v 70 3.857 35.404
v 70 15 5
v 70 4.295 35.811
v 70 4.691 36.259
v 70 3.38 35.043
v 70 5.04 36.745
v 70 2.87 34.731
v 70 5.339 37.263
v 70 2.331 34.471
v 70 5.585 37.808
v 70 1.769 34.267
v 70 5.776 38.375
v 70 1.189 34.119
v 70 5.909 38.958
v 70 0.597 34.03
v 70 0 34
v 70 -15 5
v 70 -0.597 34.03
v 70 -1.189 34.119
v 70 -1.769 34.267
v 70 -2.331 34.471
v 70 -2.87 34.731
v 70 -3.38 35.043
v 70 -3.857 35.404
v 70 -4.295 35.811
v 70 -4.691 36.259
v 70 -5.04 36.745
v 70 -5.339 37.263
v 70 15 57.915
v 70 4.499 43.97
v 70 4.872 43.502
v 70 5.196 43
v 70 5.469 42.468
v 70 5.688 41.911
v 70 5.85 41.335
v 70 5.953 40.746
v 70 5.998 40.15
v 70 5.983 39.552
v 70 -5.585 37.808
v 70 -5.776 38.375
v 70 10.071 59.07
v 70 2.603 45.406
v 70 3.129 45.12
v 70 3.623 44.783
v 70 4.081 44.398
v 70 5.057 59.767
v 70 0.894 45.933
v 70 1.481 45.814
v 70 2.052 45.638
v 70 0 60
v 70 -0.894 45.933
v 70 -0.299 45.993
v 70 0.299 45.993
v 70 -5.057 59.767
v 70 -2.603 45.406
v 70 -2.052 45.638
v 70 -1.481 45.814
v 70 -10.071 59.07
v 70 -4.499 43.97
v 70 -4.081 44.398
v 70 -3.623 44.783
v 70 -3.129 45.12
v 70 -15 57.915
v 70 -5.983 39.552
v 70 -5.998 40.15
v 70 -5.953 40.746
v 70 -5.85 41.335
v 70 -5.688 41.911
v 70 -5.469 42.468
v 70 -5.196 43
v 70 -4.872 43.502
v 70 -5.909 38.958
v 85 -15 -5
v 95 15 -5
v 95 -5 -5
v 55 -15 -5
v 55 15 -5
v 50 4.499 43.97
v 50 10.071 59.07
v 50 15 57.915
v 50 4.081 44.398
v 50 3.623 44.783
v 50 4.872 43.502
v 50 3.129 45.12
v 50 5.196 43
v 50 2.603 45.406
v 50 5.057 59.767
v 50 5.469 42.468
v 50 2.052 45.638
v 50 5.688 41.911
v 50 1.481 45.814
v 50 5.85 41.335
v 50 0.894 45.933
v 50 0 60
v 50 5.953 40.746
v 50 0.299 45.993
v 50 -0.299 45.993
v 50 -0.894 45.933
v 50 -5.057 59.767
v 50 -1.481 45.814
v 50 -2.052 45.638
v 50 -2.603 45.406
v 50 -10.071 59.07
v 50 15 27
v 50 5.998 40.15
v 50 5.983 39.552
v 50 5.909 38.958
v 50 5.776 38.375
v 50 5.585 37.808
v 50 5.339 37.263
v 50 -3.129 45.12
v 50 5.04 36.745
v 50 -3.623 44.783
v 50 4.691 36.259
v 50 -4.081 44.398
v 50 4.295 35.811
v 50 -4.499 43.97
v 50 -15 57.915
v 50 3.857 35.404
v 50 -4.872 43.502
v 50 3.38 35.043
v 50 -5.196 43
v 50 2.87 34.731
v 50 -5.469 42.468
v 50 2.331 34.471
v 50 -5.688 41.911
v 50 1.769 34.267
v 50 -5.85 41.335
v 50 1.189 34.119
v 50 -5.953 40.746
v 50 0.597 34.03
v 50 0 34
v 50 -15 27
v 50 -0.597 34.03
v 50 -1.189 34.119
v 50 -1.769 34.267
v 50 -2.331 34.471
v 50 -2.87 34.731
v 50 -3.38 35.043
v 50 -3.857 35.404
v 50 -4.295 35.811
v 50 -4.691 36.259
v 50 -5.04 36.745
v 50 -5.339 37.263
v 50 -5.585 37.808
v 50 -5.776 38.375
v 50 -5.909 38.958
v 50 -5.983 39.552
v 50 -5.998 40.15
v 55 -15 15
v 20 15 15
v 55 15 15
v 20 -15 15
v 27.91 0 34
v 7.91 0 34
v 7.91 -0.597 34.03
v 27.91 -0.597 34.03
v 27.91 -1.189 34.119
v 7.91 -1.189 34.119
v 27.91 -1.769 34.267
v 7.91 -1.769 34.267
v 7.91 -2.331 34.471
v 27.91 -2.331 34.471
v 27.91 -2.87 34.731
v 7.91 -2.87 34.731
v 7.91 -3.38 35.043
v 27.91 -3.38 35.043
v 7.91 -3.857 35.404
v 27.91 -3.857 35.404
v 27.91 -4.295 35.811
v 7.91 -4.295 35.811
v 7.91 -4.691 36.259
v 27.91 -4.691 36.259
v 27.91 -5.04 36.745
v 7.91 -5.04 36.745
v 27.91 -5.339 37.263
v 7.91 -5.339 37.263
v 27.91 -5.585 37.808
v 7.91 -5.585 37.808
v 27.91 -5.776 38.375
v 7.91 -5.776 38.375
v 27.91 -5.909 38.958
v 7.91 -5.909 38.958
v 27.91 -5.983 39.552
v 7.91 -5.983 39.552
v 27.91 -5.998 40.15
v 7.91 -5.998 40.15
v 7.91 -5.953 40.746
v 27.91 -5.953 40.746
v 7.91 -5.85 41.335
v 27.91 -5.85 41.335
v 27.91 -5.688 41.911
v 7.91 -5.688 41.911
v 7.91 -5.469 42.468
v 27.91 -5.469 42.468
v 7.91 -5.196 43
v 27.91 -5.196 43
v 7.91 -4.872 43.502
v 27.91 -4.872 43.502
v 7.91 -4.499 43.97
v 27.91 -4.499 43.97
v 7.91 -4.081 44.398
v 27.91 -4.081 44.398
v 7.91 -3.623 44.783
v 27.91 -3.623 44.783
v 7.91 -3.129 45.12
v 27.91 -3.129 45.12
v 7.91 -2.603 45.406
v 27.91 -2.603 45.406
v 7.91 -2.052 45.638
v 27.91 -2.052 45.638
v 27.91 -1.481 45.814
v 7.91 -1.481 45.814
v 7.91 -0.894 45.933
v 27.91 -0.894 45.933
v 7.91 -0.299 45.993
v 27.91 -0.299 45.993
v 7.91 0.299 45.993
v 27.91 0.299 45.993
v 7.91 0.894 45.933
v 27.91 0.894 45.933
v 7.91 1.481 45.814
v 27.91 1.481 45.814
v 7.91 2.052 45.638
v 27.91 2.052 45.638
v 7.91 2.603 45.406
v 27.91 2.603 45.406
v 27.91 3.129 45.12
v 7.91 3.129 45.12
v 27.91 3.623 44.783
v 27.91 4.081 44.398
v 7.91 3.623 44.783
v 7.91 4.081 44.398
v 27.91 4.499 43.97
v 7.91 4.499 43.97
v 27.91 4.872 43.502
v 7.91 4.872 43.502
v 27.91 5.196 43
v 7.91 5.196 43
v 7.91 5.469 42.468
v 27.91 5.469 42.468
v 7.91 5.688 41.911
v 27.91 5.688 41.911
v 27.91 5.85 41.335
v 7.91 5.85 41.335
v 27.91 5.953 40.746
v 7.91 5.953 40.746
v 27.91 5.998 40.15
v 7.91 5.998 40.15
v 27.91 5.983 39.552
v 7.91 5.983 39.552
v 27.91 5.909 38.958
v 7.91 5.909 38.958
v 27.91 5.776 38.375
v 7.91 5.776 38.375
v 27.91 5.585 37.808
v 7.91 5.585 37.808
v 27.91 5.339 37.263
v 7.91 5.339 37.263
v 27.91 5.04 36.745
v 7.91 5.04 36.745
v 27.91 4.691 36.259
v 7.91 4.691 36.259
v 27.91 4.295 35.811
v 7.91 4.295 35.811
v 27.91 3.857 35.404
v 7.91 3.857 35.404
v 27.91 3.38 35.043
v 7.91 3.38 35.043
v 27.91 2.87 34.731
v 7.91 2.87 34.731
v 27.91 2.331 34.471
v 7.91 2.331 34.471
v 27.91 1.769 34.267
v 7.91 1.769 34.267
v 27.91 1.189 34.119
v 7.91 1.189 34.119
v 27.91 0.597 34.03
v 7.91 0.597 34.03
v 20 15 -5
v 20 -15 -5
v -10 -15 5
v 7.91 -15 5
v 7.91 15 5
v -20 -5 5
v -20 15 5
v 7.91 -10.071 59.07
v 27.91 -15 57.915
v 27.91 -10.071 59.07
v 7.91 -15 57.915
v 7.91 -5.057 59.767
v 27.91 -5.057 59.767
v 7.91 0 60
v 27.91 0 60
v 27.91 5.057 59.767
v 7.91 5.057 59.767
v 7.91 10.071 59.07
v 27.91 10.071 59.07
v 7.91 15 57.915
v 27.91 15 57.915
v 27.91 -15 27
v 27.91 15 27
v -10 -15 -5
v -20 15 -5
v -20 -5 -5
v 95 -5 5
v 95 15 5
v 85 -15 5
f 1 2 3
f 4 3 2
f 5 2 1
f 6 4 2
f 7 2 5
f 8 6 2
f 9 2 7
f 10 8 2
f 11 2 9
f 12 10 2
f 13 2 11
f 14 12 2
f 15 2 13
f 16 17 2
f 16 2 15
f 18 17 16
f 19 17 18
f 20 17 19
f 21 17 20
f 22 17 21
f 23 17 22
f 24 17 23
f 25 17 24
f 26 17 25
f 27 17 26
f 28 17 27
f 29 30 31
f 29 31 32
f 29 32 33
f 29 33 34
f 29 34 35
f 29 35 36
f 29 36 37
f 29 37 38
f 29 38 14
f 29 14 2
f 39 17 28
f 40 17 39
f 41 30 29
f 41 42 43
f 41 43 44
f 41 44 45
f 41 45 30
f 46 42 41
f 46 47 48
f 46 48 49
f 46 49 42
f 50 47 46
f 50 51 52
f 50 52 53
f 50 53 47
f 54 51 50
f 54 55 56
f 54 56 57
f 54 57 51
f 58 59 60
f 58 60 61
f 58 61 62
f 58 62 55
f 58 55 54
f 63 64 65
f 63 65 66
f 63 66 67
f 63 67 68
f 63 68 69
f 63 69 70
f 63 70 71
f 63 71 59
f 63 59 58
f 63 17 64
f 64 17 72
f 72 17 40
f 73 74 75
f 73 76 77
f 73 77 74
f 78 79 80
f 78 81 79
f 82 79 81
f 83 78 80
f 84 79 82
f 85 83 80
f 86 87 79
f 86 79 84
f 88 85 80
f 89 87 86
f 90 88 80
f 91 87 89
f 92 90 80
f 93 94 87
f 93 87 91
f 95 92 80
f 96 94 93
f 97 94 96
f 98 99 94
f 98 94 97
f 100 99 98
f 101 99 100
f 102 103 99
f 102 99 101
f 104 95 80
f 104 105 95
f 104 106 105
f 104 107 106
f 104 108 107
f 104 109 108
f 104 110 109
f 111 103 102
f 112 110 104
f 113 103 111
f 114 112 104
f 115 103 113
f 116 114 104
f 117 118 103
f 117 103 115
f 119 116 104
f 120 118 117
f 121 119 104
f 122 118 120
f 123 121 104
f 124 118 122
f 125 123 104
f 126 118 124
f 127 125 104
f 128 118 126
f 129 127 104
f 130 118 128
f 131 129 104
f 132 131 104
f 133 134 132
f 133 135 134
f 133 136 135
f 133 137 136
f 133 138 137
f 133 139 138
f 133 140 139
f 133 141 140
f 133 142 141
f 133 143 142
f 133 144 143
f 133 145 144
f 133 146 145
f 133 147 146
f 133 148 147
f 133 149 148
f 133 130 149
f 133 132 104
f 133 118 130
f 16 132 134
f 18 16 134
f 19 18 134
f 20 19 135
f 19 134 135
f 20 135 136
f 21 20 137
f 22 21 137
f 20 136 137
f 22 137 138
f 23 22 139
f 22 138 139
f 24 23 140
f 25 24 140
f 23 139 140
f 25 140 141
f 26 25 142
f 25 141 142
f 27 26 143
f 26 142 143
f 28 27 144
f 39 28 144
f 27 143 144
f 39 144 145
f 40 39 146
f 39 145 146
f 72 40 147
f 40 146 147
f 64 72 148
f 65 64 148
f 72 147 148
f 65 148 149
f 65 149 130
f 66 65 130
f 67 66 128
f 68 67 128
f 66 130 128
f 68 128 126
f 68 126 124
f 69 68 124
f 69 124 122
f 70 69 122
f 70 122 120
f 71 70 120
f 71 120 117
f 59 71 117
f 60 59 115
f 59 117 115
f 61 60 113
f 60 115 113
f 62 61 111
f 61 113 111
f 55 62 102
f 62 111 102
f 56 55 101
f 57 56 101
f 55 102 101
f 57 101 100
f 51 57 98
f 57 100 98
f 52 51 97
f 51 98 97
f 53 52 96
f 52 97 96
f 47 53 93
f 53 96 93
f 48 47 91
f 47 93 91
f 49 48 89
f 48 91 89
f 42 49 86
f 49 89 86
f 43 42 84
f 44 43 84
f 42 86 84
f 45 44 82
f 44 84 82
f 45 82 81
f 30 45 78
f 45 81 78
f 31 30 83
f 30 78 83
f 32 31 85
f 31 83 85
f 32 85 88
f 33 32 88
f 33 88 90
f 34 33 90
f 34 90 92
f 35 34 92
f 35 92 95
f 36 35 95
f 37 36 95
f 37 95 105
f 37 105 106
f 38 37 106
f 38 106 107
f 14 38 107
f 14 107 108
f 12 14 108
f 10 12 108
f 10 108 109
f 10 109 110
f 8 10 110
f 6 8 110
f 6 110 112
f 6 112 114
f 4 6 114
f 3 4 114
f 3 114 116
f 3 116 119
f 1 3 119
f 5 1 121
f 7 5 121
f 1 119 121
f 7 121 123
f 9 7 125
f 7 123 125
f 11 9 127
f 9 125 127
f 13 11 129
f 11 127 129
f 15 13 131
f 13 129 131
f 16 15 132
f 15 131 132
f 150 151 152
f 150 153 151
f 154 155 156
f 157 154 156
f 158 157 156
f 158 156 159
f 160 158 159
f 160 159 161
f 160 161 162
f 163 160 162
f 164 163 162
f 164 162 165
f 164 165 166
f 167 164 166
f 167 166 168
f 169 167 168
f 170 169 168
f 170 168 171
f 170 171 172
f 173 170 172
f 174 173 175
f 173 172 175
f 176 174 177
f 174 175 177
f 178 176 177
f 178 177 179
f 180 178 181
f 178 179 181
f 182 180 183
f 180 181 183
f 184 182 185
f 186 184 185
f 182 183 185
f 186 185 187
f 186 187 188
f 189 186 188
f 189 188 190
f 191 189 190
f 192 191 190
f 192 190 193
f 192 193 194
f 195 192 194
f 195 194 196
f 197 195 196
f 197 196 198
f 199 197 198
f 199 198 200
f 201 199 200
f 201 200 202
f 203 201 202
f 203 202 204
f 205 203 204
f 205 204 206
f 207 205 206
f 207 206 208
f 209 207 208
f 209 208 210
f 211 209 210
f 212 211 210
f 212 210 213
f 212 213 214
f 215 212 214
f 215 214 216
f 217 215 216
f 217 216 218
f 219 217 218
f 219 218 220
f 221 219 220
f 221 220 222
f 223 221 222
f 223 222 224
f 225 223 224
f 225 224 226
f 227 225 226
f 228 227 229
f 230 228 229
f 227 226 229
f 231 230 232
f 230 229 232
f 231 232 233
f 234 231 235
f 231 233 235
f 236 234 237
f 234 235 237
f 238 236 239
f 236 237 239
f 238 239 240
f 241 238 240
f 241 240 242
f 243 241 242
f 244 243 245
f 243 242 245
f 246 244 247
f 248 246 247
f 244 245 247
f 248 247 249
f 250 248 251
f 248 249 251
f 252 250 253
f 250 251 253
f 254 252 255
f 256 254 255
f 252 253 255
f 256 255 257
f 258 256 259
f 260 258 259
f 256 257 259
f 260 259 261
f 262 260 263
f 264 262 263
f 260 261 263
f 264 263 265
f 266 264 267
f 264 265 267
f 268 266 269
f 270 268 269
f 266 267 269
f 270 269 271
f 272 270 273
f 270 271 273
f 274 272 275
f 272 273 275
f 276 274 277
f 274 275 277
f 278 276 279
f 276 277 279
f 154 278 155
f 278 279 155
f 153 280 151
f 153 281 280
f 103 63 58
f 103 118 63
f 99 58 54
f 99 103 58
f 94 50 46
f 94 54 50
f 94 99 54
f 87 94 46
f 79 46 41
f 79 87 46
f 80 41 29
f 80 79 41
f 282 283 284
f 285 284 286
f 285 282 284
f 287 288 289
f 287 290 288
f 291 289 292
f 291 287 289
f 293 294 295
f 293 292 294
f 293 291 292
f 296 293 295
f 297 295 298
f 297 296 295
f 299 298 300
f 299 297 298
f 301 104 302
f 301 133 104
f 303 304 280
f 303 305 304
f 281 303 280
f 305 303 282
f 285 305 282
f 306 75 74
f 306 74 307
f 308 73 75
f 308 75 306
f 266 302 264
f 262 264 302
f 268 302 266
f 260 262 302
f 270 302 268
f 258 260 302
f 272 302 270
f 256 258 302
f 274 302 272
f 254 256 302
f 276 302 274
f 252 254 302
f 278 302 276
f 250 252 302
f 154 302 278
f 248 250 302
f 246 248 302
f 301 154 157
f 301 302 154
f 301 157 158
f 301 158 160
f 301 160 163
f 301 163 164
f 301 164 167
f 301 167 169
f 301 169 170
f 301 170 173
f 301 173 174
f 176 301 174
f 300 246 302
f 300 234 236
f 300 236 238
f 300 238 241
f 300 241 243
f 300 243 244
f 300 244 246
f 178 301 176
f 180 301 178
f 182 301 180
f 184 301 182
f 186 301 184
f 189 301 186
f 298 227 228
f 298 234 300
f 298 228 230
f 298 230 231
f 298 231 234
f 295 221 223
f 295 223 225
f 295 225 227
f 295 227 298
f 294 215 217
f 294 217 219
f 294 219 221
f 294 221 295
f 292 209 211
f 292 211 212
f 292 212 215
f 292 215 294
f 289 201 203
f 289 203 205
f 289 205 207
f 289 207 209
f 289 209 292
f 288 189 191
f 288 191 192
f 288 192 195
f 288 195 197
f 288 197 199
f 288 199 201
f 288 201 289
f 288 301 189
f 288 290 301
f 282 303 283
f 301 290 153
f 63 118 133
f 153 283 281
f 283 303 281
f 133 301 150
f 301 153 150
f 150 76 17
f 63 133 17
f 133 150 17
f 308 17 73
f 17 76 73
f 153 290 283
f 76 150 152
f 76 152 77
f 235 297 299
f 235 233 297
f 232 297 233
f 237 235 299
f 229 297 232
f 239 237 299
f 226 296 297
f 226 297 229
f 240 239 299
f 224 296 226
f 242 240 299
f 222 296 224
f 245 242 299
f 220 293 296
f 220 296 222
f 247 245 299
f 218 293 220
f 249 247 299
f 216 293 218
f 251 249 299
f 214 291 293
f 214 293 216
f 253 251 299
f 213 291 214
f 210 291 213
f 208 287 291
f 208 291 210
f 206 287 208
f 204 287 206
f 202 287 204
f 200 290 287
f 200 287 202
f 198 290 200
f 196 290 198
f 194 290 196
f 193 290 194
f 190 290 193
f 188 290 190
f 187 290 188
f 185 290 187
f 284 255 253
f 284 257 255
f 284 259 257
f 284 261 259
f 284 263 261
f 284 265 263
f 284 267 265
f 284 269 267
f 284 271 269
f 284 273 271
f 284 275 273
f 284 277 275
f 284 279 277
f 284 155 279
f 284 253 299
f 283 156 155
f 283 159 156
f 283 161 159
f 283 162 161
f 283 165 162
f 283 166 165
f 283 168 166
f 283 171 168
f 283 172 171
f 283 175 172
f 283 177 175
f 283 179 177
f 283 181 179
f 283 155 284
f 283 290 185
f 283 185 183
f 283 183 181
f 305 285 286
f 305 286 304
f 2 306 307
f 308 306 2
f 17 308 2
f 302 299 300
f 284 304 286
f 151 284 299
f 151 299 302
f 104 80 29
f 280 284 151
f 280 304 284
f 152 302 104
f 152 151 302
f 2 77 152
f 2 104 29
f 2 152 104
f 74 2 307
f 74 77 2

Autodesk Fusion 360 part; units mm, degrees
sketch "Sketch1" plane through (0, 0, 0) normal (0, 1, 0) x (1, 0, 0)
  line L0 (-20, -5) -> (-20, 5)
  line L1 (-20, 5) -> (20, 5)
  line L2 (20, 5) -> (20, -15)
  line L3 (20, -15) -> (55, -15)
  line L4 (55, -15) -> (55, 5)
  line L5 (55, 5) -> (85, 5)
  line L6 (85, 5) -> (95, 5)
  line L7 (95, 5) -> (95, -5)
  line L8 (95, -5) -> (70, -5)
  line L9 (70, -5) -> (70, -60)
  line L10 (70, -60) -> (50, -60)
  line L11 (50, -60) -> (50, -27)
  line L12 (50, -27) -> (27.9096, -27)
  line L13 (27.9096, -27) -> (27.9096, -60)
  line L14 (27.9096, -60) -> (7.9096, -60)
  line L15 (7.9096, -60) -> (7.9096, -5)
  line L16 (7.9096, -5) -> (-20, -5)
  dimension "d2" = 20
extrude "Extrude1" add sketch "Sketch1" along normal mid plane 30
chamfer "Chamfer1" distance 10 angle 45 2 edges at (-20, -15, 0) (95, -15, 0)
sketch "Sketch2" plane through (70, 0, 0) normal (1, 0, 0) x (0, 1, 0)
  line L0 (-15, 5) -> (15, 5)
  line L1 (15, 5) -> (15, 60)
  line L2 (15, 60) -> (-15, 60)
  line L3 (-15, 60) -> (-15, 5)
  point P0 (0, 40)
hole "Hole1" at (70, 0, 40) direction (-1, 0, 0) diameter 12 depth 65 tip angle 118
sketch "Sketch4" plane through (7.9096, 0, 0) normal (-1, 0, 0) x (0, -1, 0)
  circle A0 centre (0, 40) radius 6
  line L0 (15, 60) -> (-15, 60)
  line L1 (-15, 60) -> (-15, 5)
  line L2 (-15, 5) -> (15, 5)
  line L3 (15, 5) -> (15, 60)
  circle A1 centre (0, 5) radius 55
extrude "Extrude2" cut sketch "Sketch4" against normal blind 12311 contours L0 L3 A1 | L0 L1 A1
